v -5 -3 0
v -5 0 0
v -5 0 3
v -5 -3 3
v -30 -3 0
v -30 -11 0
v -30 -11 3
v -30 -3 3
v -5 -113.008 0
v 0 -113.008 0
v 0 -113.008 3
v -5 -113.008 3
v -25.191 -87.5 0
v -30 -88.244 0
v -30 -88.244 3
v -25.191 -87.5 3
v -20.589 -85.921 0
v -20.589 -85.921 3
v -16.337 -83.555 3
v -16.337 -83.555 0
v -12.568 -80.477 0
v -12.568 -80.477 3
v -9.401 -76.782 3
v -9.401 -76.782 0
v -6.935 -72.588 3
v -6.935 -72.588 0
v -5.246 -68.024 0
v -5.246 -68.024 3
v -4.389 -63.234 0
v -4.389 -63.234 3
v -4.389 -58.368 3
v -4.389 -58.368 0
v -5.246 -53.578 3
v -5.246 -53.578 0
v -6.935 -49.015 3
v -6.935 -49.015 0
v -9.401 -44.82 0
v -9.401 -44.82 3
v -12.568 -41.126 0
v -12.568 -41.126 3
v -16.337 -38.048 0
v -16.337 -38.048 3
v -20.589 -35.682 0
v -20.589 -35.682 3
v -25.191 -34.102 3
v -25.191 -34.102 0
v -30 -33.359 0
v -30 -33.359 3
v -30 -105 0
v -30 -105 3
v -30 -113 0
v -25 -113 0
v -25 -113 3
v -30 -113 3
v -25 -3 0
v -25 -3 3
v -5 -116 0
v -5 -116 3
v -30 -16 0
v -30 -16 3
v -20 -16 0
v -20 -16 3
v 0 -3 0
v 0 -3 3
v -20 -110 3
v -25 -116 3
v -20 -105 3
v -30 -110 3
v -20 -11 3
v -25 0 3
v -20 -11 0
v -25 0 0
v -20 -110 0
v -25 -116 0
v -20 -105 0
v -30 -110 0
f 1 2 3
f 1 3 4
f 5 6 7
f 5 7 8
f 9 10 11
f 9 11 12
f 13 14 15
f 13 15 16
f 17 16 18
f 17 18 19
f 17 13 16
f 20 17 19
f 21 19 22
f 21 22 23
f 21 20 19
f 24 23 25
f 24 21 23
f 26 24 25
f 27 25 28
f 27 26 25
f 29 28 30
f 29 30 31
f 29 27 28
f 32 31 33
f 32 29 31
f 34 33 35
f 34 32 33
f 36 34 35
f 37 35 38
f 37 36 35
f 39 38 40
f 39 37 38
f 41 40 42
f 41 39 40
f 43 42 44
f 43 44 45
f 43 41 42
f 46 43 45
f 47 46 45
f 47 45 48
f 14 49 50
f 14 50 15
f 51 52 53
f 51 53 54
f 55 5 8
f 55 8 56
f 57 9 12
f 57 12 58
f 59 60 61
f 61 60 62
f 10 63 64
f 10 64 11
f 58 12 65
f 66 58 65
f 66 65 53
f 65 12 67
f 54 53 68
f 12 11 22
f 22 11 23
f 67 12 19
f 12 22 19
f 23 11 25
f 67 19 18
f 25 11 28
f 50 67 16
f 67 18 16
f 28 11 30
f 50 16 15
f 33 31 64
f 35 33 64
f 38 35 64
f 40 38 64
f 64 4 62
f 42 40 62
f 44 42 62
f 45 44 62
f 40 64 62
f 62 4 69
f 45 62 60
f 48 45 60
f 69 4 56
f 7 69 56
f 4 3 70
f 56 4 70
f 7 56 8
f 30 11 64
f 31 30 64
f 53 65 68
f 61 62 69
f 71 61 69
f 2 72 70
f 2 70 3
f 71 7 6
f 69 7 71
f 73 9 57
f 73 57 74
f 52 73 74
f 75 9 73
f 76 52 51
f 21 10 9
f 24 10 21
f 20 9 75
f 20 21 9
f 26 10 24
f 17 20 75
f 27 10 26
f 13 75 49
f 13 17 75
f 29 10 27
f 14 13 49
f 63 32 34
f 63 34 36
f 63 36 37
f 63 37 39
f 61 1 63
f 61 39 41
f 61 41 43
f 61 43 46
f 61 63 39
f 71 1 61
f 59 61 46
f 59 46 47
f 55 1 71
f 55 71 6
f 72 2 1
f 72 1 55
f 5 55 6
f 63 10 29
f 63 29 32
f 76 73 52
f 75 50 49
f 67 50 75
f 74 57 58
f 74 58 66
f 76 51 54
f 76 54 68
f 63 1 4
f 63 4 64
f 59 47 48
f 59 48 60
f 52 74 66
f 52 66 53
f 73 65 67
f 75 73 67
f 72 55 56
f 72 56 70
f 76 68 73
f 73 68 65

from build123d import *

# Parameters (mm, degrees)
BOSS_EXTRUDE1_DEPTH = 3
SKETCH2_W           = 10
SKETCH2_H           = 5
CUT_EXTRUDE1_DEPTH  = 3


with BuildPart() as part:
    # Sketch1 → Boss-Extrude1 (new body)
    with BuildSketch(Plane.XY):
        with BuildLine():
            Line((-5, 0), (-5, -3))
            Line((-5, -3), (0, -3))
            Line((0, -3), (0, -113.008152331))
            Line((0, -113.008152331), (-5, -113.008152331))
            Line((-5, -113.008152331), (-5, -116))
            Line((-5, -116), (-25, -116))
            Line((-25, -116), (-25, -113))
            Line((-25, -113), (-30, -113))
            Line((-30, -113), (-30, -88.243527021))
            ThreePointArc((-30, -88.243527021), (-4.280708477, -60.801240722), (-30, -33.358954423))
            Line((-30, -33.358954423), (-30, -3))
            Line((-30, -3), (-25, -3))
            Line((-25, -3), (-25, 0))
            Line((-25, 0), (-5, 0))
        make_face()
    extrude(amount=BOSS_EXTRUDE1_DEPTH)

    # Sketch2 → Cut-Extrude1 (cut)
    with BuildSketch(Plane.XY.offset(3)):
        with Locations((-25, -107.5)):
            Rectangle(SKETCH2_W, SKETCH2_H)
        with Locations((-25, -13.5)):
            Rectangle(SKETCH2_W, SKETCH2_H)
    extrude(amount=-CUT_EXTRUDE1_DEPTH, mode=Mode.SUBTRACT)


solid = part.part
